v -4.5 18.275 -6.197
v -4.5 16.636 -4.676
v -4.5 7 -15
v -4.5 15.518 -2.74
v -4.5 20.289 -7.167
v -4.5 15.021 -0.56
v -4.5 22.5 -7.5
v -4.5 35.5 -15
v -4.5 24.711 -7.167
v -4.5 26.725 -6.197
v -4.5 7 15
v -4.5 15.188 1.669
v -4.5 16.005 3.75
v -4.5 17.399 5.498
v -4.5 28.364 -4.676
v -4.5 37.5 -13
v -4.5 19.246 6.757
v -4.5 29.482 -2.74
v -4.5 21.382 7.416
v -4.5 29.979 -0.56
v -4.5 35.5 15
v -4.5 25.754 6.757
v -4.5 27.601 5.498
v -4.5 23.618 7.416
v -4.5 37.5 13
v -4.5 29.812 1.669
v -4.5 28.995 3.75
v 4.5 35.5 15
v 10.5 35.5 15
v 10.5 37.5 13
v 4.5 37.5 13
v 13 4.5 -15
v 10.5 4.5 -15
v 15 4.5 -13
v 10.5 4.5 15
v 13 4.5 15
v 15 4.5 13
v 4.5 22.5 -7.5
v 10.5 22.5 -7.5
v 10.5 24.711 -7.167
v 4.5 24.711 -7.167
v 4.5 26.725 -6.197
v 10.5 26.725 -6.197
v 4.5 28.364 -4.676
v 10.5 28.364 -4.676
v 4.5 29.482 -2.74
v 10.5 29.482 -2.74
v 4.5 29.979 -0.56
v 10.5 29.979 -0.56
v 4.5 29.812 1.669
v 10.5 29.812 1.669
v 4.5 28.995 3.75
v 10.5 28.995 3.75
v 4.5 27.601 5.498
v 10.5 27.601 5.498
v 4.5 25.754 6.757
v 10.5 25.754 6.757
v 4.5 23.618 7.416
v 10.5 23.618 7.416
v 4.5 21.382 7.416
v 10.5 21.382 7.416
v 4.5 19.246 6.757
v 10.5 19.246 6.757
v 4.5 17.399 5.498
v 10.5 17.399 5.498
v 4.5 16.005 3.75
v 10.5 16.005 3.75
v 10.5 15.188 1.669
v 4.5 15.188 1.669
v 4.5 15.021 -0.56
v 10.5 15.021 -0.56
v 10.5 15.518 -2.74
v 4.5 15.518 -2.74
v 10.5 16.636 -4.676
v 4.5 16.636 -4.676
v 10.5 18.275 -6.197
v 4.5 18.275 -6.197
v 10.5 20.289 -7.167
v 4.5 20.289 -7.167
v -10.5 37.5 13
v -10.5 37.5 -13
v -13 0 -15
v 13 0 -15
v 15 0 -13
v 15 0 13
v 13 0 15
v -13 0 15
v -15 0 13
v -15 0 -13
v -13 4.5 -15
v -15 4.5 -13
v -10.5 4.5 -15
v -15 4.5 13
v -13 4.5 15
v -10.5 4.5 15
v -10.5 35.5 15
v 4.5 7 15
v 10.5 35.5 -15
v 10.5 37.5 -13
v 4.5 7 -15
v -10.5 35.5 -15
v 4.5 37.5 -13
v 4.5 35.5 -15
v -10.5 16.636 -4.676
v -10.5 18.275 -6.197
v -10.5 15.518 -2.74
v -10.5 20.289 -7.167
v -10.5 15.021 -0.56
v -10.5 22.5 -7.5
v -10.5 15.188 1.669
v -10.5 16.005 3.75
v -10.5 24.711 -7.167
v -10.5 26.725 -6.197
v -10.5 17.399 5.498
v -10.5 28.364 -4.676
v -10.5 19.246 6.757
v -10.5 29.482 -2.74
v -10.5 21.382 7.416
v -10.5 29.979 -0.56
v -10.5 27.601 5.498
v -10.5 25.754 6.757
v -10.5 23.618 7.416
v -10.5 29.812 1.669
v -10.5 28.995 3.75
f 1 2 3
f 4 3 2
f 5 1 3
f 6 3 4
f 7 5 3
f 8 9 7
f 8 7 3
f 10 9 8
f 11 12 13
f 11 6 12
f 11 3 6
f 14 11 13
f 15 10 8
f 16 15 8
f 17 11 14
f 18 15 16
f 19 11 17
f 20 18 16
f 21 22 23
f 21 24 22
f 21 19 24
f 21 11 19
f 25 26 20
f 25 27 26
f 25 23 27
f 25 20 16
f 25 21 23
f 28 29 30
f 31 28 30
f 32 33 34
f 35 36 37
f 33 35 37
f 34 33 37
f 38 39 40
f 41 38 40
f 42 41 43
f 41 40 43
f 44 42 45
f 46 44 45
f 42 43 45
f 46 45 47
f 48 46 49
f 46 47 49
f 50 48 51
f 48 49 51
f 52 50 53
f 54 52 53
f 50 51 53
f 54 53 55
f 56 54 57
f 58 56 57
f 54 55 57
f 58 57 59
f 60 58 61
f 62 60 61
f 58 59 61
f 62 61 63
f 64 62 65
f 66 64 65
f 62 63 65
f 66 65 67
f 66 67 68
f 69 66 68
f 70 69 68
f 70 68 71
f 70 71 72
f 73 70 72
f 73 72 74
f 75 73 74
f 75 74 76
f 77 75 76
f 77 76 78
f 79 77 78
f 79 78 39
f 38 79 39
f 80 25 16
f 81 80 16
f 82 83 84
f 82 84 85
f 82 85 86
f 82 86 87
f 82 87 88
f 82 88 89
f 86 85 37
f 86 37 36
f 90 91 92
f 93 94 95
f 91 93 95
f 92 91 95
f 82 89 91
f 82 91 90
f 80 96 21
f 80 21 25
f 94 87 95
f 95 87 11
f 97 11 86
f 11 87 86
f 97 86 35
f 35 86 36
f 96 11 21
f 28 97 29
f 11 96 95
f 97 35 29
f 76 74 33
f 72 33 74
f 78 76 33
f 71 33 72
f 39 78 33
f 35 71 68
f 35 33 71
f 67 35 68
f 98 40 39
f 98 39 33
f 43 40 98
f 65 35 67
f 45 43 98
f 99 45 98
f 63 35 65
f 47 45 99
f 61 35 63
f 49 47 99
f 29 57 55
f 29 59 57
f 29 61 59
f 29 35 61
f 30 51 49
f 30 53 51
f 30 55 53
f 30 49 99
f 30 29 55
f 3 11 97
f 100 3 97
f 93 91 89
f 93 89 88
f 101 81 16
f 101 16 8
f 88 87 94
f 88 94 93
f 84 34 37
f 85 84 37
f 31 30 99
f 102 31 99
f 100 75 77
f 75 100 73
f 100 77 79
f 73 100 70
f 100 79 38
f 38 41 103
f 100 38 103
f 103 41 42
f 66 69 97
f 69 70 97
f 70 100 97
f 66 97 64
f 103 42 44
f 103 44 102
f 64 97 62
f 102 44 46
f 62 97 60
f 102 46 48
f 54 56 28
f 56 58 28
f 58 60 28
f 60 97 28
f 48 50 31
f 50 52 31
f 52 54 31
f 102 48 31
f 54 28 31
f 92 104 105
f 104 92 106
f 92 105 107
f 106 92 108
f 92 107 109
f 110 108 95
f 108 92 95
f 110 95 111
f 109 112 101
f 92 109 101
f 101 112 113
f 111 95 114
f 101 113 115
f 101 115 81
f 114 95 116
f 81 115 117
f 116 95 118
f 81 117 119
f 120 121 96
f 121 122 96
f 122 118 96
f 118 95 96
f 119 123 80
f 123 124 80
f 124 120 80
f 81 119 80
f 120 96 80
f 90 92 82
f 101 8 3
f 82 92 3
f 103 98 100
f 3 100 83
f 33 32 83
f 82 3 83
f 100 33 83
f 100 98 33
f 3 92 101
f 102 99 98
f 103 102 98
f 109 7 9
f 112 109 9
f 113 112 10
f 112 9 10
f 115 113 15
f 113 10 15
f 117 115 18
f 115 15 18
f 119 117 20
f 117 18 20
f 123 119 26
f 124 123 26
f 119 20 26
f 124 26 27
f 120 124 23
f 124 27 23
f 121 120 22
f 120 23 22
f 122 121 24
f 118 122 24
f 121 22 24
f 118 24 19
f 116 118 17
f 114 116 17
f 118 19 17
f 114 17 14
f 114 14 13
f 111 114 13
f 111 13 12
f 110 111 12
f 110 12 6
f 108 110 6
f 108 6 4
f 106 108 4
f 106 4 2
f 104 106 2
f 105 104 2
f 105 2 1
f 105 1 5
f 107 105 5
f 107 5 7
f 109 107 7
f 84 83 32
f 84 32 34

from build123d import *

# Parameters (mm, degrees)
EXTRUDE_1_DEPTH     = 4.5
EXTRUDE_2_DEPTH     = 30
SKETCH_3_W          = 4.5
SKETCH_3_H          = 33
SKETCH_3_W_2        = 9
SKETCH_3_H_2        = 30.5
CUT_EXTRUDE_1_DEPTH = 30
SKETCH_4_R          = 7.5
CUT_EXTRUDE_2_DEPTH = 30


with BuildPart() as part:
    # 草图1 → 凸台-拉伸1 (new body)
    with BuildSketch(Plane(origin=(0, 0, 0), x_dir=(1, 0, 0), z_dir=(0, 1, 0))):
        Polygon((-15, 13), (-13, 15), (13, 15), (15, 13), (15, -13), (13, -15), (-13, -15), (-15, -13), align=None)
    extrude(amount=EXTRUDE_1_DEPTH)

    # 草图2 → 凸台-拉伸2 (add)
    with BuildSketch(Plane(origin=(15, 0, 0), x_dir=(0, 0, -1), z_dir=(1, 0, 0))):
        Polygon((-15, 4.5), (-15, 35.5), (-13, 37.5), (13, 37.5), (15, 35.5), (15, 4.5), align=None)
    extrude(amount=-EXTRUDE_2_DEPTH)

    # 草图3 → 切除-拉伸1 (cut)
    with BuildSketch(Plane.XY.offset(15)):
        with Locations((-12.75, 21)):
            Rectangle(SKETCH_3_W, SKETCH_3_H)
        with Locations((12.75, 21)):
            Rectangle(SKETCH_3_W, SKETCH_3_H)
        with Locations((0, 22.25)):
            Rectangle(SKETCH_3_W_2, SKETCH_3_H_2)
    extrude(amount=-CUT_EXTRUDE_1_DEPTH, mode=Mode.SUBTRACT)

    # 草图4 → 切除-拉伸2 (cut)
    with BuildSketch(Plane(origin=(10.5, 0, 0), x_dir=(0, 0, -1), z_dir=(1, 0, 0))):
        with Locations((0, 22.5)):
            Circle(SKETCH_4_R)
    extrude(amount=-CUT_EXTRUDE_2_DEPTH, mode=Mode.SUBTRACT)


solid = part.part
